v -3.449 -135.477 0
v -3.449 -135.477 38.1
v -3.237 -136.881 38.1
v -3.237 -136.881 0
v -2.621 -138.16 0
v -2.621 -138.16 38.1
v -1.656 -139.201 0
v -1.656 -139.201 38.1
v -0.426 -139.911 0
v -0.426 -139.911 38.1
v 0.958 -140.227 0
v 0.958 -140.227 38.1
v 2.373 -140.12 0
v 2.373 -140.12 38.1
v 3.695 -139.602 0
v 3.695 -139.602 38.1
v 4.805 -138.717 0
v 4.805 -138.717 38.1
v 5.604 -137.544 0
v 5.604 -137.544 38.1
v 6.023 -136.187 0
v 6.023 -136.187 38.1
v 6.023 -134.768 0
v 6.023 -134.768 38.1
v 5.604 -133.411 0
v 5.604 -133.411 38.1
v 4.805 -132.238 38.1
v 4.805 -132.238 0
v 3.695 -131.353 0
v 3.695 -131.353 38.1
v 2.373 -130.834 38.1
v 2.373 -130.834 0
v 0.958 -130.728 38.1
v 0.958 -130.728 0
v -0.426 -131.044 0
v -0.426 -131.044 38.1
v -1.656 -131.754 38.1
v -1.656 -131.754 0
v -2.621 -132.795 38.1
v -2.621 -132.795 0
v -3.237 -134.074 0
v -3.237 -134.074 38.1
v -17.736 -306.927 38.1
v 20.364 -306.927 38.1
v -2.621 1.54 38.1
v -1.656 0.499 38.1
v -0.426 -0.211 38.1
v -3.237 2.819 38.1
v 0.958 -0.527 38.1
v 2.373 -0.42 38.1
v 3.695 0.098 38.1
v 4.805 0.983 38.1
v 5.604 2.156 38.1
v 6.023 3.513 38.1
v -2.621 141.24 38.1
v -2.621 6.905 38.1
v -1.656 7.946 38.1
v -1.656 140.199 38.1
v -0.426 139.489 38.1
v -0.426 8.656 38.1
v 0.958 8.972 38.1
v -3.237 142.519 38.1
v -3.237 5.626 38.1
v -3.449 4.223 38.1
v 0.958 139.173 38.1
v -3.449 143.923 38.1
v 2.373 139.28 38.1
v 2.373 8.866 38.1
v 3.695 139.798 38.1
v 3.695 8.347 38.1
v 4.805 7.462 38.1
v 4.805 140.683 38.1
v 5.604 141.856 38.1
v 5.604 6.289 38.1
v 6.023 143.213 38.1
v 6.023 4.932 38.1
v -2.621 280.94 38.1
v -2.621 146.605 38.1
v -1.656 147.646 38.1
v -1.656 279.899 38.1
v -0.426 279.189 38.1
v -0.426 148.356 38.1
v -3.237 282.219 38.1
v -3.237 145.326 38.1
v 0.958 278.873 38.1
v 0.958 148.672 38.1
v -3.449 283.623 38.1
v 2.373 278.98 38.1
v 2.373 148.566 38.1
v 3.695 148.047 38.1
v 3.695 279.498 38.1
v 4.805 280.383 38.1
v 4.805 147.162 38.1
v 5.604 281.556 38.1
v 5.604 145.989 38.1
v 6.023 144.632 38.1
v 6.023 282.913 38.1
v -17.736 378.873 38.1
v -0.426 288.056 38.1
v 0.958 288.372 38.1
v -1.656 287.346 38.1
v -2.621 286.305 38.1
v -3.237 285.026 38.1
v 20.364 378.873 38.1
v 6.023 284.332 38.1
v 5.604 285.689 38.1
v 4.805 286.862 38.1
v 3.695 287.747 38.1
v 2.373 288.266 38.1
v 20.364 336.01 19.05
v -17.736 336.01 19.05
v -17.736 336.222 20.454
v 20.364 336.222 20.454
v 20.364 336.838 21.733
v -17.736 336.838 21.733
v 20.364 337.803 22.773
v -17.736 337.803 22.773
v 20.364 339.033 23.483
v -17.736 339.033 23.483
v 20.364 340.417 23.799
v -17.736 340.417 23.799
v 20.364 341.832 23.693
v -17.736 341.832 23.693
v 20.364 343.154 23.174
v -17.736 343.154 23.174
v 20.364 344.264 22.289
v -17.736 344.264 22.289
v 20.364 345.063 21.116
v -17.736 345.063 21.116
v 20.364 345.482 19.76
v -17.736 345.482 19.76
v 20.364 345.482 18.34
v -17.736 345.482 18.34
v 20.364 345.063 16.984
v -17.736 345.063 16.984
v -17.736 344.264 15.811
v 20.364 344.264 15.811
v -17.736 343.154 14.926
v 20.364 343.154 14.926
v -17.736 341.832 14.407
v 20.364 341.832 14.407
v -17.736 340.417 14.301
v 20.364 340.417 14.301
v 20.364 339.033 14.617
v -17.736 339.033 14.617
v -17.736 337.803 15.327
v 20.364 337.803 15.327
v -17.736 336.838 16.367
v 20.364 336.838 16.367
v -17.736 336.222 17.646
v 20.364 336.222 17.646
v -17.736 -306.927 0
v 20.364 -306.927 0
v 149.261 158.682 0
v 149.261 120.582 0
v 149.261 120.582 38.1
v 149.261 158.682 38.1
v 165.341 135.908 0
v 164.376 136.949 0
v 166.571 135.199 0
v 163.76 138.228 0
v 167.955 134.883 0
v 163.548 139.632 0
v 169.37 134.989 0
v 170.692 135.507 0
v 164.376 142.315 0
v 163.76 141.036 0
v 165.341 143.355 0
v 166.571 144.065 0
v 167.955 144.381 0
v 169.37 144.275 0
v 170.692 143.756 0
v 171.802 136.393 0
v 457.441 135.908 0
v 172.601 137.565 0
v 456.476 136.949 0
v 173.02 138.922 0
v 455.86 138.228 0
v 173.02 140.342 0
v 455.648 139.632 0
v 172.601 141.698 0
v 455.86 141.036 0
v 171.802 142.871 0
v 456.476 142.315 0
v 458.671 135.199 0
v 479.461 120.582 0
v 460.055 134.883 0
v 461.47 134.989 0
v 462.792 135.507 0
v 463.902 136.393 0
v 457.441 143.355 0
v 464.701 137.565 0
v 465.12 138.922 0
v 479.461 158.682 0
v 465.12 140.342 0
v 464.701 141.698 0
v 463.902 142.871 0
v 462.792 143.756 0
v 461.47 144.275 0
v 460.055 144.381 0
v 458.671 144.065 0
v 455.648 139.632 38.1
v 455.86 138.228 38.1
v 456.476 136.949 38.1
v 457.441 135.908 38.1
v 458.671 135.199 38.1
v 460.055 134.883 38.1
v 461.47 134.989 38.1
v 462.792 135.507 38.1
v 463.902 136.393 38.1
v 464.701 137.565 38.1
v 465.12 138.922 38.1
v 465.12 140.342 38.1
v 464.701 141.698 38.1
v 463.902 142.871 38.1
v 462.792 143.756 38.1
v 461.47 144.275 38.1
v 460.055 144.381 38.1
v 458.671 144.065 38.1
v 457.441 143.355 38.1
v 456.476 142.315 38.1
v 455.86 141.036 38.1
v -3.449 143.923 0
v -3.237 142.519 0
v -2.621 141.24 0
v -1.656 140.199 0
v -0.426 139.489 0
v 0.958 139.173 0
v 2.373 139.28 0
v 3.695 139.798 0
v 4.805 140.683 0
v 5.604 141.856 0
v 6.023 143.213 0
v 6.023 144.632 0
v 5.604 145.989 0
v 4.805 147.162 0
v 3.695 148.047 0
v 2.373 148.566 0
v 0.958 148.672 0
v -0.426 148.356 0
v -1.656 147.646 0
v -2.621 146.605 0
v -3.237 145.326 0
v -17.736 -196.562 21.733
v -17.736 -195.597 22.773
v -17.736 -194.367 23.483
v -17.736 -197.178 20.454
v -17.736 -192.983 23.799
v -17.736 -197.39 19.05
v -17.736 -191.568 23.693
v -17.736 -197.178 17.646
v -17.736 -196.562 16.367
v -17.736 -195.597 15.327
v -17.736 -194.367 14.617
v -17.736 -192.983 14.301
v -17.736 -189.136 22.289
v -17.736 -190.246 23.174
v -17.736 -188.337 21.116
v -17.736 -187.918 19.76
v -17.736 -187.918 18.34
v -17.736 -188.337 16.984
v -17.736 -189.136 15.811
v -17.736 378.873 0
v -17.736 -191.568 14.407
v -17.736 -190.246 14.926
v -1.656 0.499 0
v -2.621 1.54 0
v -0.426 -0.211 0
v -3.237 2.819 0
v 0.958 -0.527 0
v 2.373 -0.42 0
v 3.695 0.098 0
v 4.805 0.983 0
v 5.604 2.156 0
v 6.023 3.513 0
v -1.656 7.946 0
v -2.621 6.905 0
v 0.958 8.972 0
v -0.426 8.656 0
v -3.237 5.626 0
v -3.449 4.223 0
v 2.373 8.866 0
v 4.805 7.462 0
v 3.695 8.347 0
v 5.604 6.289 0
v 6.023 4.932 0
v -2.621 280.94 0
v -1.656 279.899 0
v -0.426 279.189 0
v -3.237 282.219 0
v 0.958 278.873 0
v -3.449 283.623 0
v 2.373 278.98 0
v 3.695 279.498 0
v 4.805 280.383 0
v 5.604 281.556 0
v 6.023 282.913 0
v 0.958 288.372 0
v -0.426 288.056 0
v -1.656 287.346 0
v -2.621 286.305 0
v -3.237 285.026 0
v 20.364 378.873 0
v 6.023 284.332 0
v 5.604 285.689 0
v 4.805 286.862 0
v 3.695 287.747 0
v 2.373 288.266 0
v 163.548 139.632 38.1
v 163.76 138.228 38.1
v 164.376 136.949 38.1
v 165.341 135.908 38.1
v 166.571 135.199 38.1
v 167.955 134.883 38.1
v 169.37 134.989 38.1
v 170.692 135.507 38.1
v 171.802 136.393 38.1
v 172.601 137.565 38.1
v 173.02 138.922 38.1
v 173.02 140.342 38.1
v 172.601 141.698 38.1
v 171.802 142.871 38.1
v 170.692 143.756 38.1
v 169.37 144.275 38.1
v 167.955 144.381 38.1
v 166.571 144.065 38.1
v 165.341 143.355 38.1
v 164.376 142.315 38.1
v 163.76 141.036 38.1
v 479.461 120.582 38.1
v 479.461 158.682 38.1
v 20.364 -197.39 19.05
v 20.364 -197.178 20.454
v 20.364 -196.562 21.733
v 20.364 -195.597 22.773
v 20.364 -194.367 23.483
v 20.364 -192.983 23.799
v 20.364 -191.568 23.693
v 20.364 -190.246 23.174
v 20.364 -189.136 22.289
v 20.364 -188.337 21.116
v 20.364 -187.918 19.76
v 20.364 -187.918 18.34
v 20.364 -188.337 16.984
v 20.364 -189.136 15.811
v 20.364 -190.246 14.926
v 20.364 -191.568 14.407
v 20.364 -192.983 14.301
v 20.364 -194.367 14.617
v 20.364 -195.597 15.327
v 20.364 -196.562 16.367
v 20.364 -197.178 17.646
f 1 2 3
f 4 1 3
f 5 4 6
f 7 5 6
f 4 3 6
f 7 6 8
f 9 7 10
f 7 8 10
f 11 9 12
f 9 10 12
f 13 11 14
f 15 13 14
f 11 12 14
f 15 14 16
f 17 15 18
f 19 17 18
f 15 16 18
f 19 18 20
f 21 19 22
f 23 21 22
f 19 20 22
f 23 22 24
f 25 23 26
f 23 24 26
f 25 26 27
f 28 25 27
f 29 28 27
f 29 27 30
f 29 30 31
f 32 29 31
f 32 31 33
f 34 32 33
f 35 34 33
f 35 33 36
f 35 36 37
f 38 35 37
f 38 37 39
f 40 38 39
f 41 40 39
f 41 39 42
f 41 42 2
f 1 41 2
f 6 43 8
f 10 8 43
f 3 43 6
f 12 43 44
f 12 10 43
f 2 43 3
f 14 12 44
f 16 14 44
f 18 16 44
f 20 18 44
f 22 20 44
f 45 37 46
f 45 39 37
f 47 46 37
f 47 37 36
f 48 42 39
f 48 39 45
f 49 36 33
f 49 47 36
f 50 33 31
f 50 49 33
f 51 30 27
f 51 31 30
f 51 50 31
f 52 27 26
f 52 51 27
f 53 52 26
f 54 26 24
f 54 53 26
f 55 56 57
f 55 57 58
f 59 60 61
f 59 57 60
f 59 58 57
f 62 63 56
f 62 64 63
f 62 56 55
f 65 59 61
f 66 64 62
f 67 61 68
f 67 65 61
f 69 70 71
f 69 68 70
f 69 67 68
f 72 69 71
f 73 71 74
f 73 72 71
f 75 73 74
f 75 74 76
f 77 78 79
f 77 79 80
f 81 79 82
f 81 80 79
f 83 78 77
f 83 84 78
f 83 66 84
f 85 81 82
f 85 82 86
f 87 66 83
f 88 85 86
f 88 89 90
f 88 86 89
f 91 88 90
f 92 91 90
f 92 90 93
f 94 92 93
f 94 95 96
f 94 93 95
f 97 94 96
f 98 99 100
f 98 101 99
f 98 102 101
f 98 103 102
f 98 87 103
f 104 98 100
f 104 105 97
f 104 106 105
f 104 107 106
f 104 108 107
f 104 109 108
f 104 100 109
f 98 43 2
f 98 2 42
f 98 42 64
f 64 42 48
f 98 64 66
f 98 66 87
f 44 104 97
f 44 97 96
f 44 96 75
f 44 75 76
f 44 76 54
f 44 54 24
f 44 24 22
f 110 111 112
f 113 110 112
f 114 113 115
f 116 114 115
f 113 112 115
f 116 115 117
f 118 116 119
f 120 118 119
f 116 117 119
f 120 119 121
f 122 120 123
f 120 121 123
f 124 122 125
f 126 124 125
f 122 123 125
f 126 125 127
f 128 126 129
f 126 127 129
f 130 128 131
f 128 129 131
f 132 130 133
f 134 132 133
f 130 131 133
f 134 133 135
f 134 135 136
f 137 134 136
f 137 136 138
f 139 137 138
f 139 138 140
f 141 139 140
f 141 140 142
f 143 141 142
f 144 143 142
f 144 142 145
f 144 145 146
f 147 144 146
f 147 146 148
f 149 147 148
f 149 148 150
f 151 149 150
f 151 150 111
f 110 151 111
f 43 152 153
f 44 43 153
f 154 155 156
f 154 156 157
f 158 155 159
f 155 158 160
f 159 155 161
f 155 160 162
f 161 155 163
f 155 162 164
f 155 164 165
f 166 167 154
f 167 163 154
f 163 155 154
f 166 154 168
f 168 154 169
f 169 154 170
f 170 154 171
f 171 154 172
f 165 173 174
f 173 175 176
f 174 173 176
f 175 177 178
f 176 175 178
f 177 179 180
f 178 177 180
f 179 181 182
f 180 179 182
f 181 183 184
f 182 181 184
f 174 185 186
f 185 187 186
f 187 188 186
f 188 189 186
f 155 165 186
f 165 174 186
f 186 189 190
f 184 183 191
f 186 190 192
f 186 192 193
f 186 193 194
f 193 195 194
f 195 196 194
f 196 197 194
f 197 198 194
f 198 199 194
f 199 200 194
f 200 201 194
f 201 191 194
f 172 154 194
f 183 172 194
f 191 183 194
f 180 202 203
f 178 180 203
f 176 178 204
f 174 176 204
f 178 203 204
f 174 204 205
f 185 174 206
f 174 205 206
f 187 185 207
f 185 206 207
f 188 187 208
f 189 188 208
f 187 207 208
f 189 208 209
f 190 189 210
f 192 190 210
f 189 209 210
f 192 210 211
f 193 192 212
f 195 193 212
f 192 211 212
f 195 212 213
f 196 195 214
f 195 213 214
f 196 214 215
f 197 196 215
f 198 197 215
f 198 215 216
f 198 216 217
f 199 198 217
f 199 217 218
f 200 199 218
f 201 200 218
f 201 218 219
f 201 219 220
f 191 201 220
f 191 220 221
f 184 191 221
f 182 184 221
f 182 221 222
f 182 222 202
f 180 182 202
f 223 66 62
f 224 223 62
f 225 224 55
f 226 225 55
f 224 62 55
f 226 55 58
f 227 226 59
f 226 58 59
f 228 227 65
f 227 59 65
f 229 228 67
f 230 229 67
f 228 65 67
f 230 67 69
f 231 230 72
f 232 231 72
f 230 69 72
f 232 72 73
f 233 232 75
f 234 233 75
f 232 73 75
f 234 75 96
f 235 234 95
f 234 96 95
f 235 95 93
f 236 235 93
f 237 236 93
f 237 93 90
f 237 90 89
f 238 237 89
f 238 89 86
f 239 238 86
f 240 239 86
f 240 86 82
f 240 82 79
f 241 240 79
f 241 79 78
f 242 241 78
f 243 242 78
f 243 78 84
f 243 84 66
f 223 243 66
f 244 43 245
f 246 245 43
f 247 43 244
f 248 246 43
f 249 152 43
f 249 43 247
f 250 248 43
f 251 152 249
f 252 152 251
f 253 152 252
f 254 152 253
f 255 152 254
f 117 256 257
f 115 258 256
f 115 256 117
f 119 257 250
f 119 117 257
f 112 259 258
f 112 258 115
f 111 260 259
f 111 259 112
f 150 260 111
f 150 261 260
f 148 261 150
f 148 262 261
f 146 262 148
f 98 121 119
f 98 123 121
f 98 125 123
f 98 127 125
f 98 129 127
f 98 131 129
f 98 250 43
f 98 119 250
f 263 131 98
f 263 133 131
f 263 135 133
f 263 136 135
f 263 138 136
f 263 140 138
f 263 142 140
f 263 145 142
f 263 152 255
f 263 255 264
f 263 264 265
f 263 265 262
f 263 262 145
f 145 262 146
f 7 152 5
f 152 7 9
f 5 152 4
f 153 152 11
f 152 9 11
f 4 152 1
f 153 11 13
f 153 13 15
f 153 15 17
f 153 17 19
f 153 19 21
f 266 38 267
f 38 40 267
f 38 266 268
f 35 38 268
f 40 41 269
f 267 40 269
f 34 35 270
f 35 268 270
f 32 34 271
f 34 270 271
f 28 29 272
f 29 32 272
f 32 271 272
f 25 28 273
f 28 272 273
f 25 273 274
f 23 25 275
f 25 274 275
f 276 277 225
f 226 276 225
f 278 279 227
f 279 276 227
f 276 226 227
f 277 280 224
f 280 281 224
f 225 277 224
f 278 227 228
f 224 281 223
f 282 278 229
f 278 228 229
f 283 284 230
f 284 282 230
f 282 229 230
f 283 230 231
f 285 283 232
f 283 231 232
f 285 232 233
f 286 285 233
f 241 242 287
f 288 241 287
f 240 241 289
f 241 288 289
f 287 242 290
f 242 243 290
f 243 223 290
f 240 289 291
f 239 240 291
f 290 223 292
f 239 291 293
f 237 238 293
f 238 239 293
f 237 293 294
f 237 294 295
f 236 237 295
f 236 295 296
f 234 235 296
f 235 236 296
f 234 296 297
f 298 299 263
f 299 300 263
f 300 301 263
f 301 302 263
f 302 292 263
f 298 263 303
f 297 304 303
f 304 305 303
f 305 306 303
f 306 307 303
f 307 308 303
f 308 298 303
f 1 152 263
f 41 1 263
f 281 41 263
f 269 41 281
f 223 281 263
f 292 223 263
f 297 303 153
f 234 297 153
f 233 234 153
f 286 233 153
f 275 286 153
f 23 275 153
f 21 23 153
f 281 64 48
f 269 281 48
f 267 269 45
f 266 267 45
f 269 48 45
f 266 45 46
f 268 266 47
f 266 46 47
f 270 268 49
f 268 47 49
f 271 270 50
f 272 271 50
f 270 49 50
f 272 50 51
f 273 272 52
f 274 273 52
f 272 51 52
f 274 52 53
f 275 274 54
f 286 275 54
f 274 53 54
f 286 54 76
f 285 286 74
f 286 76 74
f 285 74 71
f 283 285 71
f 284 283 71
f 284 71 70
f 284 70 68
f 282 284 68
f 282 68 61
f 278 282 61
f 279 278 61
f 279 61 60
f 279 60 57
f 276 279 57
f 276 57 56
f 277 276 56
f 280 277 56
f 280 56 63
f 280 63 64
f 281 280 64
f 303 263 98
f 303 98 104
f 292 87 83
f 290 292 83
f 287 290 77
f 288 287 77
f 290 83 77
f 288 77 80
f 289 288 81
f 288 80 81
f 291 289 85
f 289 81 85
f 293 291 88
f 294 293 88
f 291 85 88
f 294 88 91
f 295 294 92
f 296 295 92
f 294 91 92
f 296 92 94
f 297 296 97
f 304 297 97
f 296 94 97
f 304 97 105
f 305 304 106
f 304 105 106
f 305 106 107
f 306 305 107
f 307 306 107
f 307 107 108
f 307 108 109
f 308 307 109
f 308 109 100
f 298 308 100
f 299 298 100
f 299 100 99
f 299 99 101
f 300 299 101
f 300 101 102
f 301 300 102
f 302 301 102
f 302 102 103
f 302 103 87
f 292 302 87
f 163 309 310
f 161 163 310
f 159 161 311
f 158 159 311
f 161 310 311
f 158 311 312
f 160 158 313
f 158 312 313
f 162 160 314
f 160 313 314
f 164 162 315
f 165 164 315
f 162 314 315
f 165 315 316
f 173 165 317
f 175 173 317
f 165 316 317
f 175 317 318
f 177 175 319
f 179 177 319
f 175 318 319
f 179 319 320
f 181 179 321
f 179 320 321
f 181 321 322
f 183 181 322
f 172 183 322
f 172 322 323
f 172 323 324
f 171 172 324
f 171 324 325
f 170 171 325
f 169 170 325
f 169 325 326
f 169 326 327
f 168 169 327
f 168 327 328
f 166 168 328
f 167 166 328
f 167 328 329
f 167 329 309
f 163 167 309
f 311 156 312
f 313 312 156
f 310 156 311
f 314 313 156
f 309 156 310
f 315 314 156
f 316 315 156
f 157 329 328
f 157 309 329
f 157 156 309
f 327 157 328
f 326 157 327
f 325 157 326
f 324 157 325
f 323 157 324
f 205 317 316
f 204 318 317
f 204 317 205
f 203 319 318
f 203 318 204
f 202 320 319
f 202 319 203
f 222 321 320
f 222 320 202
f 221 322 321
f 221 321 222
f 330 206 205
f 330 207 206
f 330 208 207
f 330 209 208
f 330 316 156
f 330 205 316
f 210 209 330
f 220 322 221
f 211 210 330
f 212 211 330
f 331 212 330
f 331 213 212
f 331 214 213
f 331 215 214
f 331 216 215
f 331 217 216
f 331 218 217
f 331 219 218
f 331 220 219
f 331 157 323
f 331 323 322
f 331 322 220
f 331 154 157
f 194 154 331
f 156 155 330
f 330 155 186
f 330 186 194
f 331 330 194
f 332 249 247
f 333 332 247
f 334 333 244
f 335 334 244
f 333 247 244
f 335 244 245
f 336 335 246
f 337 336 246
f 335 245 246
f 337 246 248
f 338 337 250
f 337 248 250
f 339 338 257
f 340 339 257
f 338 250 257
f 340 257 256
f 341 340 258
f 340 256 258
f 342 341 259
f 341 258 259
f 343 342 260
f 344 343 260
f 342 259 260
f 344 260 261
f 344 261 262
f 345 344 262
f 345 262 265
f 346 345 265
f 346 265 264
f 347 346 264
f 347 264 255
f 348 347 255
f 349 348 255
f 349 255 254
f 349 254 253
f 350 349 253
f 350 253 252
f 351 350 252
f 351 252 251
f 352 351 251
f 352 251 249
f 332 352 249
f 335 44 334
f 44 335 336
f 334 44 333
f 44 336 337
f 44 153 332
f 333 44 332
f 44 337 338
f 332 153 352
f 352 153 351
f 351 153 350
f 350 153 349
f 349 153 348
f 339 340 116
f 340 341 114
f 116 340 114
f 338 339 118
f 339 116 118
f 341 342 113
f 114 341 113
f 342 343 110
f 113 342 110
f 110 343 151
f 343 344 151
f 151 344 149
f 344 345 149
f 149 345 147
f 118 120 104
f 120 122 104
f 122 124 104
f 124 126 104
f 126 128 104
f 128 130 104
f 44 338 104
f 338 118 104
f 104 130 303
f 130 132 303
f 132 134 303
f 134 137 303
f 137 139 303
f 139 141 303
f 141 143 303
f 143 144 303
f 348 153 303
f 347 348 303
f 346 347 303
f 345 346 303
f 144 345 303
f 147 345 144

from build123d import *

# Parameters (mm, degrees)
F0_W      = 38.1
F0_H      = 685.8
F1_DEPTH  = 38.1
F4_D      = 9.525
F5_D      = 9.525
F6_D      = 9.525
F7_D      = 9.525
F8_D      = 9.525
F9_D      = 9.525
F10_W     = 330.2
F10_H     = 38.1
F11_DEPTH = 38.1
F12_D     = 9.525
F13_D     = 9.525


# Not quite as in the source:
# - a feature names something its author has since deleted; it is built from what else it names


with BuildPart() as f1:
    # F0 (on Top) → F1 (new body)
    with BuildSketch(Plane.XY):
        with Locations((1.3135822982, 35.9726289988)):
            Rectangle(F0_W, F0_H)
    extrude(amount=F1_DEPTH)

    # F4 (through all)
    with Locations(Plane(origin=(0, 0, 0), x_dir=(1, 0, 0), z_dir=(0, 0, -1))):
        with Locations((1.3135822982, 135.4773710012)):
            Hole(F4_D / 2)

    # F5 (through all)
    with Locations(Plane(origin=(0, 0, 0), x_dir=(1, 0, 0), z_dir=(0, 0, -1))):
        with Locations((1.3135822982, -4.2226289988)):
            Hole(F5_D / 2)

    # F6 (through all)
    with Locations(Plane(origin=(0, 0, 0), x_dir=(1, 0, 0), z_dir=(0, 0, -1))):
        with Locations((1.3135822982, -143.9226289988)):
            Hole(F6_D / 2)

    # F7 (through all)
    with Locations(Plane(origin=(0, 0, 0), x_dir=(1, 0, 0), z_dir=(0, 0, -1))):
        with Locations((1.3135822982, -283.6226289988)):
            Hole(F7_D / 2)

    # F8 (through all)
    with Locations(Plane.YZ.offset(20.3635822982)):
        with Locations((-192.6273710012, 19.05)):
            Hole(F8_D / 2)

    # F9 (through all)
    with Locations(Plane.YZ.offset(20.3635822982)):
        with Locations((340.7726289988, 19.05)):
            Hole(F9_D / 2)


with BuildPart() as f11:
    # F10 (on Top) → F11 (new body)
    with BuildSketch(Plane.XY):
        with Locations((314.3605970383, 139.6318280578)):
            Rectangle(F10_W, F10_H)
    extrude(amount=F11_DEPTH)

    # F12 (through all)
    with Locations(Plane(origin=(0, 0, 0), x_dir=(1, 0, 0), z_dir=(0, 0, -1))):
        with Locations((168.3105970383, -139.6318280578)):
            Hole(F12_D / 2)

    # F13 (through all)
    with Locations(Plane(origin=(0, 0, 0), x_dir=(1, 0, 0), z_dir=(0, 0, -1))):
        with Locations((460.4105970383, -139.6318280578)):
            Hole(F13_D / 2)


solid = Compound([f1.part, f11.part])
